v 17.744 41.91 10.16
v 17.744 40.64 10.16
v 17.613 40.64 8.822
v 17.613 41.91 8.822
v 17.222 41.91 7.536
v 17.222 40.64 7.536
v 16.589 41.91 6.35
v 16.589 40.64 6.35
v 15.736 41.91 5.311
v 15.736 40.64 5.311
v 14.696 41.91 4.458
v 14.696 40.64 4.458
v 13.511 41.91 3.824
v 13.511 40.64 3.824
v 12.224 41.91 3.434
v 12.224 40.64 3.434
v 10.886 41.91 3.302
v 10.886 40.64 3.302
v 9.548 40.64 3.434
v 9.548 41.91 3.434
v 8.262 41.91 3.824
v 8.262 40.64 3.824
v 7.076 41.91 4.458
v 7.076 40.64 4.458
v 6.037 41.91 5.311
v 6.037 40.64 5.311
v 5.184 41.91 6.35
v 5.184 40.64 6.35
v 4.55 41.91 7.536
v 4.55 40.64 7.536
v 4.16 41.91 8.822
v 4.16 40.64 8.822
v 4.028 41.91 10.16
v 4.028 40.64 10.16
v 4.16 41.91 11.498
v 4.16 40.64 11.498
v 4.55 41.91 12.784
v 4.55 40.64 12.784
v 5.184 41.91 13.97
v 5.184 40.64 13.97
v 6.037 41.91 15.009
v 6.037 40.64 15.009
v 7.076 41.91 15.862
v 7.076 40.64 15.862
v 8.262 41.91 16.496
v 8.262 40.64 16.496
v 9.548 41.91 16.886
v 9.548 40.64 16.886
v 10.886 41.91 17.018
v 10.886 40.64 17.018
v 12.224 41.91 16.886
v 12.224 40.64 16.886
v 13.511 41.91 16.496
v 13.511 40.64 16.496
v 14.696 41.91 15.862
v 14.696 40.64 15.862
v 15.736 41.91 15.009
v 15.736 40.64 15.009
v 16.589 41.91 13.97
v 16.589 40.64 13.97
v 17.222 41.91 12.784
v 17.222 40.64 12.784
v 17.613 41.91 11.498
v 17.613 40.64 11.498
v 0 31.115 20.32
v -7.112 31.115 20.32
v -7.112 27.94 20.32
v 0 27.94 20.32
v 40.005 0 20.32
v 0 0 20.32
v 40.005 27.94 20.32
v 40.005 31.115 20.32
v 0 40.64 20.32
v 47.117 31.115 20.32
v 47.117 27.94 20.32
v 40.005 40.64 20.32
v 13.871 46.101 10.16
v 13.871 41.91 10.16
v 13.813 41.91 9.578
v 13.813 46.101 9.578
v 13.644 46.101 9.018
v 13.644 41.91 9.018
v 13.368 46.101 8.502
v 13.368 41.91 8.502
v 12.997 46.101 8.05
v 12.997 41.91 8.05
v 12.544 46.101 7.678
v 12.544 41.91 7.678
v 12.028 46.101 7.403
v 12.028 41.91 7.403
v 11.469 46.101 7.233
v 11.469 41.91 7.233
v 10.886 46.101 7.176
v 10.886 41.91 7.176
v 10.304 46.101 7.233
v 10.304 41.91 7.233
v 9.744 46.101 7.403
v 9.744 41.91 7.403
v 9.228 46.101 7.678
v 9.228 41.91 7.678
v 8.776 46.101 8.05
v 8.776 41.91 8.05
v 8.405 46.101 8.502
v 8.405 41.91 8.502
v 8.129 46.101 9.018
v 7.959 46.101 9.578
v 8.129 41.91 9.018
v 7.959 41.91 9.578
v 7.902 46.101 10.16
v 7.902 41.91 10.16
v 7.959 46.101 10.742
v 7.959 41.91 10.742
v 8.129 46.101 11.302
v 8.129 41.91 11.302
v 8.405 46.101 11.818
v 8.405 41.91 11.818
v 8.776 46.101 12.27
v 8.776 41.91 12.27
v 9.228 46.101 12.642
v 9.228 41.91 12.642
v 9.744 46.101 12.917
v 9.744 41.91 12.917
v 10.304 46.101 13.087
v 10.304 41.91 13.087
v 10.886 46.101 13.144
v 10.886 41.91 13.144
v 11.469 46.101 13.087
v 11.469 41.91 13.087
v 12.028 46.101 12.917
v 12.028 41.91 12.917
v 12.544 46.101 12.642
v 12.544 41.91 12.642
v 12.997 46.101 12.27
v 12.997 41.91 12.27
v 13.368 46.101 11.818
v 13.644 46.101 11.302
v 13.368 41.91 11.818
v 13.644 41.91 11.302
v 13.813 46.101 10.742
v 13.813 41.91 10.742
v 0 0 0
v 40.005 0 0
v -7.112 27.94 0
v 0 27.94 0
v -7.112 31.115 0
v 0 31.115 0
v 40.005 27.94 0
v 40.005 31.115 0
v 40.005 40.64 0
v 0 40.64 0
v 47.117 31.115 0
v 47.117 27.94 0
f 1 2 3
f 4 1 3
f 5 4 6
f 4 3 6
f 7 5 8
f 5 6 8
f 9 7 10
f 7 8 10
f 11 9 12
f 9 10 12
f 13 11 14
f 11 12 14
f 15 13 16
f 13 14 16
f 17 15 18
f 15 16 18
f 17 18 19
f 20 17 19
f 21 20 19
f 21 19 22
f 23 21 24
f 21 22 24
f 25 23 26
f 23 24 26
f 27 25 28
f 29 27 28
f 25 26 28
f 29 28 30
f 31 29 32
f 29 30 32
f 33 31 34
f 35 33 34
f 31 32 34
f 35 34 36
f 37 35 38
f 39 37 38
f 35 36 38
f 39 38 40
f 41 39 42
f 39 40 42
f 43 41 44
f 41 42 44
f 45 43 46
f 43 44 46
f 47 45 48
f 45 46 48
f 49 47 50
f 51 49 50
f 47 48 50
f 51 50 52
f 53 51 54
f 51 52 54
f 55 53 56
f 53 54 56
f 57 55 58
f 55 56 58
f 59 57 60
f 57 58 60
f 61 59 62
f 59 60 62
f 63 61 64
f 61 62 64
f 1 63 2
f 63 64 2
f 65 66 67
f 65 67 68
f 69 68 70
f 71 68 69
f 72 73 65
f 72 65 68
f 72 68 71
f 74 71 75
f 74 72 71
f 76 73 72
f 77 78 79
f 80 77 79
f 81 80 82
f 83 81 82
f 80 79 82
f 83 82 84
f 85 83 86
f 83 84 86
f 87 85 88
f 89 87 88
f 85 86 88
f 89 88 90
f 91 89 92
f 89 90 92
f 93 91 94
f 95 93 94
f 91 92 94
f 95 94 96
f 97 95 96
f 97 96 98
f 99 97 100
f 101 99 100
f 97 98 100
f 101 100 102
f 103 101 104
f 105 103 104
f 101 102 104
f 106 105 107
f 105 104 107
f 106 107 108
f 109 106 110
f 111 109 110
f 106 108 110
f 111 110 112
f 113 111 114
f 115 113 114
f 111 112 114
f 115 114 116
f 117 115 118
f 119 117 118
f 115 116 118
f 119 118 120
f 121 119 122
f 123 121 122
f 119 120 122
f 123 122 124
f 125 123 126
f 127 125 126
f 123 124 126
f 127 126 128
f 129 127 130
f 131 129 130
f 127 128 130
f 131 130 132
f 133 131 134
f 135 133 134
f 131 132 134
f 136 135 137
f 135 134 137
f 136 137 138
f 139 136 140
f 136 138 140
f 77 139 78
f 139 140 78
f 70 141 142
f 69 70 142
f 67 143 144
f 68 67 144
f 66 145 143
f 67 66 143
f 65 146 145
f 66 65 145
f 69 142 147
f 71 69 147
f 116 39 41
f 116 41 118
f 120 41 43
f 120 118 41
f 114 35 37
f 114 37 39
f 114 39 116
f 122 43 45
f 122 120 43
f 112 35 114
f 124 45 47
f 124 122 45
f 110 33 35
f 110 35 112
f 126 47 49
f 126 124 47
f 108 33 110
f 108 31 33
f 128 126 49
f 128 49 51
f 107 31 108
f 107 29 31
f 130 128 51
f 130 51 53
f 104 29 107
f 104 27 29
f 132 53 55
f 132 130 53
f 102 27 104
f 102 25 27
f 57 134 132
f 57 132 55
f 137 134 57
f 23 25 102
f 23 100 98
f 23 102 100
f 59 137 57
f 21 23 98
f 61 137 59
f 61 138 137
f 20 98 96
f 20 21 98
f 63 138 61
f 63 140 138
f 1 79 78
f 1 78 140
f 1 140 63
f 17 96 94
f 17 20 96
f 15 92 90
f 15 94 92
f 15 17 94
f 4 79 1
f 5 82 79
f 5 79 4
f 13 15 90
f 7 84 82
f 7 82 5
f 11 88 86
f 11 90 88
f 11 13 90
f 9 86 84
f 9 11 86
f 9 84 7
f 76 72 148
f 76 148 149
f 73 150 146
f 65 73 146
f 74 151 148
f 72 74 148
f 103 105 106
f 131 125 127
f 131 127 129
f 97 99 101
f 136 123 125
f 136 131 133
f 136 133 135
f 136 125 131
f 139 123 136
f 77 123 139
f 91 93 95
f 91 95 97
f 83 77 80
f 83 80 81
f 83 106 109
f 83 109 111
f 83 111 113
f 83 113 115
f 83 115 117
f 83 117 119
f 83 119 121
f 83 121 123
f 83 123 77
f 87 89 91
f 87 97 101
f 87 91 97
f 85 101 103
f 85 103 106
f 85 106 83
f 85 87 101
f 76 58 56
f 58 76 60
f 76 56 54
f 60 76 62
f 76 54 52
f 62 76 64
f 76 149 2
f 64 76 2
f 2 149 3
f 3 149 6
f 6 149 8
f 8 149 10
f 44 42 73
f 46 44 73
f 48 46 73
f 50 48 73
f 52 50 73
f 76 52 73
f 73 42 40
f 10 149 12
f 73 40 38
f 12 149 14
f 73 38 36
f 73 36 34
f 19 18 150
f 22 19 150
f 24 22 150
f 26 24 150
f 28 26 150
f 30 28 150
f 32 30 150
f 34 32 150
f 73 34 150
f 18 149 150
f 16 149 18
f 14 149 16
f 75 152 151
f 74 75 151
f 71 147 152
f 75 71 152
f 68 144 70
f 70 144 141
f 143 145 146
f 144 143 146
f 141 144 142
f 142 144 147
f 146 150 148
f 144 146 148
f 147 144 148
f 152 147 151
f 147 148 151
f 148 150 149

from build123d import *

# Parameters (mm, degrees)
BOSS_EXTRUDE1_DEPTH = 20.32
SKETCH2_R           = 6.858
BOSS_EXTRUDE2_DEPTH = 1.27
SKETCH3_R           = 2.9845
BOSS_EXTRUDE3_DEPTH = 4.191


with BuildPart() as part:
    # Sketch1 → Boss-Extrude1 (new body)
    with BuildSketch(Plane.XY):
        Polygon((0, 0), (40.005, 0), (40.005, 27.94), (47.117, 27.94), (47.117, 31.115), (40.005, 31.115), (40.005, 40.64), (0, 40.64), (0, 31.115), (-7.112, 31.115), (-7.112, 27.94), (0, 27.94), align=None)
    extrude(amount=BOSS_EXTRUDE1_DEPTH)

    # Sketch2 → Boss-Extrude2 (add)
    with BuildSketch(Plane(origin=(0, 40.64, 0), x_dir=(1, 0, 0), z_dir=(0, 1, 0))):
        with Locations((10.886333584, -10.16)):
            Circle(SKETCH2_R)
    extrude(amount=BOSS_EXTRUDE2_DEPTH)

    # Sketch3 → Boss-Extrude3 (add)
    with BuildSketch(Plane(origin=(0, 41.91, 0), x_dir=(1, 0, 0), z_dir=(0, 1, 0))):
        with Locations((10.886333584, -10.16)):
            Circle(SKETCH3_R)
    extrude(amount=BOSS_EXTRUDE3_DEPTH)


solid = part.part
